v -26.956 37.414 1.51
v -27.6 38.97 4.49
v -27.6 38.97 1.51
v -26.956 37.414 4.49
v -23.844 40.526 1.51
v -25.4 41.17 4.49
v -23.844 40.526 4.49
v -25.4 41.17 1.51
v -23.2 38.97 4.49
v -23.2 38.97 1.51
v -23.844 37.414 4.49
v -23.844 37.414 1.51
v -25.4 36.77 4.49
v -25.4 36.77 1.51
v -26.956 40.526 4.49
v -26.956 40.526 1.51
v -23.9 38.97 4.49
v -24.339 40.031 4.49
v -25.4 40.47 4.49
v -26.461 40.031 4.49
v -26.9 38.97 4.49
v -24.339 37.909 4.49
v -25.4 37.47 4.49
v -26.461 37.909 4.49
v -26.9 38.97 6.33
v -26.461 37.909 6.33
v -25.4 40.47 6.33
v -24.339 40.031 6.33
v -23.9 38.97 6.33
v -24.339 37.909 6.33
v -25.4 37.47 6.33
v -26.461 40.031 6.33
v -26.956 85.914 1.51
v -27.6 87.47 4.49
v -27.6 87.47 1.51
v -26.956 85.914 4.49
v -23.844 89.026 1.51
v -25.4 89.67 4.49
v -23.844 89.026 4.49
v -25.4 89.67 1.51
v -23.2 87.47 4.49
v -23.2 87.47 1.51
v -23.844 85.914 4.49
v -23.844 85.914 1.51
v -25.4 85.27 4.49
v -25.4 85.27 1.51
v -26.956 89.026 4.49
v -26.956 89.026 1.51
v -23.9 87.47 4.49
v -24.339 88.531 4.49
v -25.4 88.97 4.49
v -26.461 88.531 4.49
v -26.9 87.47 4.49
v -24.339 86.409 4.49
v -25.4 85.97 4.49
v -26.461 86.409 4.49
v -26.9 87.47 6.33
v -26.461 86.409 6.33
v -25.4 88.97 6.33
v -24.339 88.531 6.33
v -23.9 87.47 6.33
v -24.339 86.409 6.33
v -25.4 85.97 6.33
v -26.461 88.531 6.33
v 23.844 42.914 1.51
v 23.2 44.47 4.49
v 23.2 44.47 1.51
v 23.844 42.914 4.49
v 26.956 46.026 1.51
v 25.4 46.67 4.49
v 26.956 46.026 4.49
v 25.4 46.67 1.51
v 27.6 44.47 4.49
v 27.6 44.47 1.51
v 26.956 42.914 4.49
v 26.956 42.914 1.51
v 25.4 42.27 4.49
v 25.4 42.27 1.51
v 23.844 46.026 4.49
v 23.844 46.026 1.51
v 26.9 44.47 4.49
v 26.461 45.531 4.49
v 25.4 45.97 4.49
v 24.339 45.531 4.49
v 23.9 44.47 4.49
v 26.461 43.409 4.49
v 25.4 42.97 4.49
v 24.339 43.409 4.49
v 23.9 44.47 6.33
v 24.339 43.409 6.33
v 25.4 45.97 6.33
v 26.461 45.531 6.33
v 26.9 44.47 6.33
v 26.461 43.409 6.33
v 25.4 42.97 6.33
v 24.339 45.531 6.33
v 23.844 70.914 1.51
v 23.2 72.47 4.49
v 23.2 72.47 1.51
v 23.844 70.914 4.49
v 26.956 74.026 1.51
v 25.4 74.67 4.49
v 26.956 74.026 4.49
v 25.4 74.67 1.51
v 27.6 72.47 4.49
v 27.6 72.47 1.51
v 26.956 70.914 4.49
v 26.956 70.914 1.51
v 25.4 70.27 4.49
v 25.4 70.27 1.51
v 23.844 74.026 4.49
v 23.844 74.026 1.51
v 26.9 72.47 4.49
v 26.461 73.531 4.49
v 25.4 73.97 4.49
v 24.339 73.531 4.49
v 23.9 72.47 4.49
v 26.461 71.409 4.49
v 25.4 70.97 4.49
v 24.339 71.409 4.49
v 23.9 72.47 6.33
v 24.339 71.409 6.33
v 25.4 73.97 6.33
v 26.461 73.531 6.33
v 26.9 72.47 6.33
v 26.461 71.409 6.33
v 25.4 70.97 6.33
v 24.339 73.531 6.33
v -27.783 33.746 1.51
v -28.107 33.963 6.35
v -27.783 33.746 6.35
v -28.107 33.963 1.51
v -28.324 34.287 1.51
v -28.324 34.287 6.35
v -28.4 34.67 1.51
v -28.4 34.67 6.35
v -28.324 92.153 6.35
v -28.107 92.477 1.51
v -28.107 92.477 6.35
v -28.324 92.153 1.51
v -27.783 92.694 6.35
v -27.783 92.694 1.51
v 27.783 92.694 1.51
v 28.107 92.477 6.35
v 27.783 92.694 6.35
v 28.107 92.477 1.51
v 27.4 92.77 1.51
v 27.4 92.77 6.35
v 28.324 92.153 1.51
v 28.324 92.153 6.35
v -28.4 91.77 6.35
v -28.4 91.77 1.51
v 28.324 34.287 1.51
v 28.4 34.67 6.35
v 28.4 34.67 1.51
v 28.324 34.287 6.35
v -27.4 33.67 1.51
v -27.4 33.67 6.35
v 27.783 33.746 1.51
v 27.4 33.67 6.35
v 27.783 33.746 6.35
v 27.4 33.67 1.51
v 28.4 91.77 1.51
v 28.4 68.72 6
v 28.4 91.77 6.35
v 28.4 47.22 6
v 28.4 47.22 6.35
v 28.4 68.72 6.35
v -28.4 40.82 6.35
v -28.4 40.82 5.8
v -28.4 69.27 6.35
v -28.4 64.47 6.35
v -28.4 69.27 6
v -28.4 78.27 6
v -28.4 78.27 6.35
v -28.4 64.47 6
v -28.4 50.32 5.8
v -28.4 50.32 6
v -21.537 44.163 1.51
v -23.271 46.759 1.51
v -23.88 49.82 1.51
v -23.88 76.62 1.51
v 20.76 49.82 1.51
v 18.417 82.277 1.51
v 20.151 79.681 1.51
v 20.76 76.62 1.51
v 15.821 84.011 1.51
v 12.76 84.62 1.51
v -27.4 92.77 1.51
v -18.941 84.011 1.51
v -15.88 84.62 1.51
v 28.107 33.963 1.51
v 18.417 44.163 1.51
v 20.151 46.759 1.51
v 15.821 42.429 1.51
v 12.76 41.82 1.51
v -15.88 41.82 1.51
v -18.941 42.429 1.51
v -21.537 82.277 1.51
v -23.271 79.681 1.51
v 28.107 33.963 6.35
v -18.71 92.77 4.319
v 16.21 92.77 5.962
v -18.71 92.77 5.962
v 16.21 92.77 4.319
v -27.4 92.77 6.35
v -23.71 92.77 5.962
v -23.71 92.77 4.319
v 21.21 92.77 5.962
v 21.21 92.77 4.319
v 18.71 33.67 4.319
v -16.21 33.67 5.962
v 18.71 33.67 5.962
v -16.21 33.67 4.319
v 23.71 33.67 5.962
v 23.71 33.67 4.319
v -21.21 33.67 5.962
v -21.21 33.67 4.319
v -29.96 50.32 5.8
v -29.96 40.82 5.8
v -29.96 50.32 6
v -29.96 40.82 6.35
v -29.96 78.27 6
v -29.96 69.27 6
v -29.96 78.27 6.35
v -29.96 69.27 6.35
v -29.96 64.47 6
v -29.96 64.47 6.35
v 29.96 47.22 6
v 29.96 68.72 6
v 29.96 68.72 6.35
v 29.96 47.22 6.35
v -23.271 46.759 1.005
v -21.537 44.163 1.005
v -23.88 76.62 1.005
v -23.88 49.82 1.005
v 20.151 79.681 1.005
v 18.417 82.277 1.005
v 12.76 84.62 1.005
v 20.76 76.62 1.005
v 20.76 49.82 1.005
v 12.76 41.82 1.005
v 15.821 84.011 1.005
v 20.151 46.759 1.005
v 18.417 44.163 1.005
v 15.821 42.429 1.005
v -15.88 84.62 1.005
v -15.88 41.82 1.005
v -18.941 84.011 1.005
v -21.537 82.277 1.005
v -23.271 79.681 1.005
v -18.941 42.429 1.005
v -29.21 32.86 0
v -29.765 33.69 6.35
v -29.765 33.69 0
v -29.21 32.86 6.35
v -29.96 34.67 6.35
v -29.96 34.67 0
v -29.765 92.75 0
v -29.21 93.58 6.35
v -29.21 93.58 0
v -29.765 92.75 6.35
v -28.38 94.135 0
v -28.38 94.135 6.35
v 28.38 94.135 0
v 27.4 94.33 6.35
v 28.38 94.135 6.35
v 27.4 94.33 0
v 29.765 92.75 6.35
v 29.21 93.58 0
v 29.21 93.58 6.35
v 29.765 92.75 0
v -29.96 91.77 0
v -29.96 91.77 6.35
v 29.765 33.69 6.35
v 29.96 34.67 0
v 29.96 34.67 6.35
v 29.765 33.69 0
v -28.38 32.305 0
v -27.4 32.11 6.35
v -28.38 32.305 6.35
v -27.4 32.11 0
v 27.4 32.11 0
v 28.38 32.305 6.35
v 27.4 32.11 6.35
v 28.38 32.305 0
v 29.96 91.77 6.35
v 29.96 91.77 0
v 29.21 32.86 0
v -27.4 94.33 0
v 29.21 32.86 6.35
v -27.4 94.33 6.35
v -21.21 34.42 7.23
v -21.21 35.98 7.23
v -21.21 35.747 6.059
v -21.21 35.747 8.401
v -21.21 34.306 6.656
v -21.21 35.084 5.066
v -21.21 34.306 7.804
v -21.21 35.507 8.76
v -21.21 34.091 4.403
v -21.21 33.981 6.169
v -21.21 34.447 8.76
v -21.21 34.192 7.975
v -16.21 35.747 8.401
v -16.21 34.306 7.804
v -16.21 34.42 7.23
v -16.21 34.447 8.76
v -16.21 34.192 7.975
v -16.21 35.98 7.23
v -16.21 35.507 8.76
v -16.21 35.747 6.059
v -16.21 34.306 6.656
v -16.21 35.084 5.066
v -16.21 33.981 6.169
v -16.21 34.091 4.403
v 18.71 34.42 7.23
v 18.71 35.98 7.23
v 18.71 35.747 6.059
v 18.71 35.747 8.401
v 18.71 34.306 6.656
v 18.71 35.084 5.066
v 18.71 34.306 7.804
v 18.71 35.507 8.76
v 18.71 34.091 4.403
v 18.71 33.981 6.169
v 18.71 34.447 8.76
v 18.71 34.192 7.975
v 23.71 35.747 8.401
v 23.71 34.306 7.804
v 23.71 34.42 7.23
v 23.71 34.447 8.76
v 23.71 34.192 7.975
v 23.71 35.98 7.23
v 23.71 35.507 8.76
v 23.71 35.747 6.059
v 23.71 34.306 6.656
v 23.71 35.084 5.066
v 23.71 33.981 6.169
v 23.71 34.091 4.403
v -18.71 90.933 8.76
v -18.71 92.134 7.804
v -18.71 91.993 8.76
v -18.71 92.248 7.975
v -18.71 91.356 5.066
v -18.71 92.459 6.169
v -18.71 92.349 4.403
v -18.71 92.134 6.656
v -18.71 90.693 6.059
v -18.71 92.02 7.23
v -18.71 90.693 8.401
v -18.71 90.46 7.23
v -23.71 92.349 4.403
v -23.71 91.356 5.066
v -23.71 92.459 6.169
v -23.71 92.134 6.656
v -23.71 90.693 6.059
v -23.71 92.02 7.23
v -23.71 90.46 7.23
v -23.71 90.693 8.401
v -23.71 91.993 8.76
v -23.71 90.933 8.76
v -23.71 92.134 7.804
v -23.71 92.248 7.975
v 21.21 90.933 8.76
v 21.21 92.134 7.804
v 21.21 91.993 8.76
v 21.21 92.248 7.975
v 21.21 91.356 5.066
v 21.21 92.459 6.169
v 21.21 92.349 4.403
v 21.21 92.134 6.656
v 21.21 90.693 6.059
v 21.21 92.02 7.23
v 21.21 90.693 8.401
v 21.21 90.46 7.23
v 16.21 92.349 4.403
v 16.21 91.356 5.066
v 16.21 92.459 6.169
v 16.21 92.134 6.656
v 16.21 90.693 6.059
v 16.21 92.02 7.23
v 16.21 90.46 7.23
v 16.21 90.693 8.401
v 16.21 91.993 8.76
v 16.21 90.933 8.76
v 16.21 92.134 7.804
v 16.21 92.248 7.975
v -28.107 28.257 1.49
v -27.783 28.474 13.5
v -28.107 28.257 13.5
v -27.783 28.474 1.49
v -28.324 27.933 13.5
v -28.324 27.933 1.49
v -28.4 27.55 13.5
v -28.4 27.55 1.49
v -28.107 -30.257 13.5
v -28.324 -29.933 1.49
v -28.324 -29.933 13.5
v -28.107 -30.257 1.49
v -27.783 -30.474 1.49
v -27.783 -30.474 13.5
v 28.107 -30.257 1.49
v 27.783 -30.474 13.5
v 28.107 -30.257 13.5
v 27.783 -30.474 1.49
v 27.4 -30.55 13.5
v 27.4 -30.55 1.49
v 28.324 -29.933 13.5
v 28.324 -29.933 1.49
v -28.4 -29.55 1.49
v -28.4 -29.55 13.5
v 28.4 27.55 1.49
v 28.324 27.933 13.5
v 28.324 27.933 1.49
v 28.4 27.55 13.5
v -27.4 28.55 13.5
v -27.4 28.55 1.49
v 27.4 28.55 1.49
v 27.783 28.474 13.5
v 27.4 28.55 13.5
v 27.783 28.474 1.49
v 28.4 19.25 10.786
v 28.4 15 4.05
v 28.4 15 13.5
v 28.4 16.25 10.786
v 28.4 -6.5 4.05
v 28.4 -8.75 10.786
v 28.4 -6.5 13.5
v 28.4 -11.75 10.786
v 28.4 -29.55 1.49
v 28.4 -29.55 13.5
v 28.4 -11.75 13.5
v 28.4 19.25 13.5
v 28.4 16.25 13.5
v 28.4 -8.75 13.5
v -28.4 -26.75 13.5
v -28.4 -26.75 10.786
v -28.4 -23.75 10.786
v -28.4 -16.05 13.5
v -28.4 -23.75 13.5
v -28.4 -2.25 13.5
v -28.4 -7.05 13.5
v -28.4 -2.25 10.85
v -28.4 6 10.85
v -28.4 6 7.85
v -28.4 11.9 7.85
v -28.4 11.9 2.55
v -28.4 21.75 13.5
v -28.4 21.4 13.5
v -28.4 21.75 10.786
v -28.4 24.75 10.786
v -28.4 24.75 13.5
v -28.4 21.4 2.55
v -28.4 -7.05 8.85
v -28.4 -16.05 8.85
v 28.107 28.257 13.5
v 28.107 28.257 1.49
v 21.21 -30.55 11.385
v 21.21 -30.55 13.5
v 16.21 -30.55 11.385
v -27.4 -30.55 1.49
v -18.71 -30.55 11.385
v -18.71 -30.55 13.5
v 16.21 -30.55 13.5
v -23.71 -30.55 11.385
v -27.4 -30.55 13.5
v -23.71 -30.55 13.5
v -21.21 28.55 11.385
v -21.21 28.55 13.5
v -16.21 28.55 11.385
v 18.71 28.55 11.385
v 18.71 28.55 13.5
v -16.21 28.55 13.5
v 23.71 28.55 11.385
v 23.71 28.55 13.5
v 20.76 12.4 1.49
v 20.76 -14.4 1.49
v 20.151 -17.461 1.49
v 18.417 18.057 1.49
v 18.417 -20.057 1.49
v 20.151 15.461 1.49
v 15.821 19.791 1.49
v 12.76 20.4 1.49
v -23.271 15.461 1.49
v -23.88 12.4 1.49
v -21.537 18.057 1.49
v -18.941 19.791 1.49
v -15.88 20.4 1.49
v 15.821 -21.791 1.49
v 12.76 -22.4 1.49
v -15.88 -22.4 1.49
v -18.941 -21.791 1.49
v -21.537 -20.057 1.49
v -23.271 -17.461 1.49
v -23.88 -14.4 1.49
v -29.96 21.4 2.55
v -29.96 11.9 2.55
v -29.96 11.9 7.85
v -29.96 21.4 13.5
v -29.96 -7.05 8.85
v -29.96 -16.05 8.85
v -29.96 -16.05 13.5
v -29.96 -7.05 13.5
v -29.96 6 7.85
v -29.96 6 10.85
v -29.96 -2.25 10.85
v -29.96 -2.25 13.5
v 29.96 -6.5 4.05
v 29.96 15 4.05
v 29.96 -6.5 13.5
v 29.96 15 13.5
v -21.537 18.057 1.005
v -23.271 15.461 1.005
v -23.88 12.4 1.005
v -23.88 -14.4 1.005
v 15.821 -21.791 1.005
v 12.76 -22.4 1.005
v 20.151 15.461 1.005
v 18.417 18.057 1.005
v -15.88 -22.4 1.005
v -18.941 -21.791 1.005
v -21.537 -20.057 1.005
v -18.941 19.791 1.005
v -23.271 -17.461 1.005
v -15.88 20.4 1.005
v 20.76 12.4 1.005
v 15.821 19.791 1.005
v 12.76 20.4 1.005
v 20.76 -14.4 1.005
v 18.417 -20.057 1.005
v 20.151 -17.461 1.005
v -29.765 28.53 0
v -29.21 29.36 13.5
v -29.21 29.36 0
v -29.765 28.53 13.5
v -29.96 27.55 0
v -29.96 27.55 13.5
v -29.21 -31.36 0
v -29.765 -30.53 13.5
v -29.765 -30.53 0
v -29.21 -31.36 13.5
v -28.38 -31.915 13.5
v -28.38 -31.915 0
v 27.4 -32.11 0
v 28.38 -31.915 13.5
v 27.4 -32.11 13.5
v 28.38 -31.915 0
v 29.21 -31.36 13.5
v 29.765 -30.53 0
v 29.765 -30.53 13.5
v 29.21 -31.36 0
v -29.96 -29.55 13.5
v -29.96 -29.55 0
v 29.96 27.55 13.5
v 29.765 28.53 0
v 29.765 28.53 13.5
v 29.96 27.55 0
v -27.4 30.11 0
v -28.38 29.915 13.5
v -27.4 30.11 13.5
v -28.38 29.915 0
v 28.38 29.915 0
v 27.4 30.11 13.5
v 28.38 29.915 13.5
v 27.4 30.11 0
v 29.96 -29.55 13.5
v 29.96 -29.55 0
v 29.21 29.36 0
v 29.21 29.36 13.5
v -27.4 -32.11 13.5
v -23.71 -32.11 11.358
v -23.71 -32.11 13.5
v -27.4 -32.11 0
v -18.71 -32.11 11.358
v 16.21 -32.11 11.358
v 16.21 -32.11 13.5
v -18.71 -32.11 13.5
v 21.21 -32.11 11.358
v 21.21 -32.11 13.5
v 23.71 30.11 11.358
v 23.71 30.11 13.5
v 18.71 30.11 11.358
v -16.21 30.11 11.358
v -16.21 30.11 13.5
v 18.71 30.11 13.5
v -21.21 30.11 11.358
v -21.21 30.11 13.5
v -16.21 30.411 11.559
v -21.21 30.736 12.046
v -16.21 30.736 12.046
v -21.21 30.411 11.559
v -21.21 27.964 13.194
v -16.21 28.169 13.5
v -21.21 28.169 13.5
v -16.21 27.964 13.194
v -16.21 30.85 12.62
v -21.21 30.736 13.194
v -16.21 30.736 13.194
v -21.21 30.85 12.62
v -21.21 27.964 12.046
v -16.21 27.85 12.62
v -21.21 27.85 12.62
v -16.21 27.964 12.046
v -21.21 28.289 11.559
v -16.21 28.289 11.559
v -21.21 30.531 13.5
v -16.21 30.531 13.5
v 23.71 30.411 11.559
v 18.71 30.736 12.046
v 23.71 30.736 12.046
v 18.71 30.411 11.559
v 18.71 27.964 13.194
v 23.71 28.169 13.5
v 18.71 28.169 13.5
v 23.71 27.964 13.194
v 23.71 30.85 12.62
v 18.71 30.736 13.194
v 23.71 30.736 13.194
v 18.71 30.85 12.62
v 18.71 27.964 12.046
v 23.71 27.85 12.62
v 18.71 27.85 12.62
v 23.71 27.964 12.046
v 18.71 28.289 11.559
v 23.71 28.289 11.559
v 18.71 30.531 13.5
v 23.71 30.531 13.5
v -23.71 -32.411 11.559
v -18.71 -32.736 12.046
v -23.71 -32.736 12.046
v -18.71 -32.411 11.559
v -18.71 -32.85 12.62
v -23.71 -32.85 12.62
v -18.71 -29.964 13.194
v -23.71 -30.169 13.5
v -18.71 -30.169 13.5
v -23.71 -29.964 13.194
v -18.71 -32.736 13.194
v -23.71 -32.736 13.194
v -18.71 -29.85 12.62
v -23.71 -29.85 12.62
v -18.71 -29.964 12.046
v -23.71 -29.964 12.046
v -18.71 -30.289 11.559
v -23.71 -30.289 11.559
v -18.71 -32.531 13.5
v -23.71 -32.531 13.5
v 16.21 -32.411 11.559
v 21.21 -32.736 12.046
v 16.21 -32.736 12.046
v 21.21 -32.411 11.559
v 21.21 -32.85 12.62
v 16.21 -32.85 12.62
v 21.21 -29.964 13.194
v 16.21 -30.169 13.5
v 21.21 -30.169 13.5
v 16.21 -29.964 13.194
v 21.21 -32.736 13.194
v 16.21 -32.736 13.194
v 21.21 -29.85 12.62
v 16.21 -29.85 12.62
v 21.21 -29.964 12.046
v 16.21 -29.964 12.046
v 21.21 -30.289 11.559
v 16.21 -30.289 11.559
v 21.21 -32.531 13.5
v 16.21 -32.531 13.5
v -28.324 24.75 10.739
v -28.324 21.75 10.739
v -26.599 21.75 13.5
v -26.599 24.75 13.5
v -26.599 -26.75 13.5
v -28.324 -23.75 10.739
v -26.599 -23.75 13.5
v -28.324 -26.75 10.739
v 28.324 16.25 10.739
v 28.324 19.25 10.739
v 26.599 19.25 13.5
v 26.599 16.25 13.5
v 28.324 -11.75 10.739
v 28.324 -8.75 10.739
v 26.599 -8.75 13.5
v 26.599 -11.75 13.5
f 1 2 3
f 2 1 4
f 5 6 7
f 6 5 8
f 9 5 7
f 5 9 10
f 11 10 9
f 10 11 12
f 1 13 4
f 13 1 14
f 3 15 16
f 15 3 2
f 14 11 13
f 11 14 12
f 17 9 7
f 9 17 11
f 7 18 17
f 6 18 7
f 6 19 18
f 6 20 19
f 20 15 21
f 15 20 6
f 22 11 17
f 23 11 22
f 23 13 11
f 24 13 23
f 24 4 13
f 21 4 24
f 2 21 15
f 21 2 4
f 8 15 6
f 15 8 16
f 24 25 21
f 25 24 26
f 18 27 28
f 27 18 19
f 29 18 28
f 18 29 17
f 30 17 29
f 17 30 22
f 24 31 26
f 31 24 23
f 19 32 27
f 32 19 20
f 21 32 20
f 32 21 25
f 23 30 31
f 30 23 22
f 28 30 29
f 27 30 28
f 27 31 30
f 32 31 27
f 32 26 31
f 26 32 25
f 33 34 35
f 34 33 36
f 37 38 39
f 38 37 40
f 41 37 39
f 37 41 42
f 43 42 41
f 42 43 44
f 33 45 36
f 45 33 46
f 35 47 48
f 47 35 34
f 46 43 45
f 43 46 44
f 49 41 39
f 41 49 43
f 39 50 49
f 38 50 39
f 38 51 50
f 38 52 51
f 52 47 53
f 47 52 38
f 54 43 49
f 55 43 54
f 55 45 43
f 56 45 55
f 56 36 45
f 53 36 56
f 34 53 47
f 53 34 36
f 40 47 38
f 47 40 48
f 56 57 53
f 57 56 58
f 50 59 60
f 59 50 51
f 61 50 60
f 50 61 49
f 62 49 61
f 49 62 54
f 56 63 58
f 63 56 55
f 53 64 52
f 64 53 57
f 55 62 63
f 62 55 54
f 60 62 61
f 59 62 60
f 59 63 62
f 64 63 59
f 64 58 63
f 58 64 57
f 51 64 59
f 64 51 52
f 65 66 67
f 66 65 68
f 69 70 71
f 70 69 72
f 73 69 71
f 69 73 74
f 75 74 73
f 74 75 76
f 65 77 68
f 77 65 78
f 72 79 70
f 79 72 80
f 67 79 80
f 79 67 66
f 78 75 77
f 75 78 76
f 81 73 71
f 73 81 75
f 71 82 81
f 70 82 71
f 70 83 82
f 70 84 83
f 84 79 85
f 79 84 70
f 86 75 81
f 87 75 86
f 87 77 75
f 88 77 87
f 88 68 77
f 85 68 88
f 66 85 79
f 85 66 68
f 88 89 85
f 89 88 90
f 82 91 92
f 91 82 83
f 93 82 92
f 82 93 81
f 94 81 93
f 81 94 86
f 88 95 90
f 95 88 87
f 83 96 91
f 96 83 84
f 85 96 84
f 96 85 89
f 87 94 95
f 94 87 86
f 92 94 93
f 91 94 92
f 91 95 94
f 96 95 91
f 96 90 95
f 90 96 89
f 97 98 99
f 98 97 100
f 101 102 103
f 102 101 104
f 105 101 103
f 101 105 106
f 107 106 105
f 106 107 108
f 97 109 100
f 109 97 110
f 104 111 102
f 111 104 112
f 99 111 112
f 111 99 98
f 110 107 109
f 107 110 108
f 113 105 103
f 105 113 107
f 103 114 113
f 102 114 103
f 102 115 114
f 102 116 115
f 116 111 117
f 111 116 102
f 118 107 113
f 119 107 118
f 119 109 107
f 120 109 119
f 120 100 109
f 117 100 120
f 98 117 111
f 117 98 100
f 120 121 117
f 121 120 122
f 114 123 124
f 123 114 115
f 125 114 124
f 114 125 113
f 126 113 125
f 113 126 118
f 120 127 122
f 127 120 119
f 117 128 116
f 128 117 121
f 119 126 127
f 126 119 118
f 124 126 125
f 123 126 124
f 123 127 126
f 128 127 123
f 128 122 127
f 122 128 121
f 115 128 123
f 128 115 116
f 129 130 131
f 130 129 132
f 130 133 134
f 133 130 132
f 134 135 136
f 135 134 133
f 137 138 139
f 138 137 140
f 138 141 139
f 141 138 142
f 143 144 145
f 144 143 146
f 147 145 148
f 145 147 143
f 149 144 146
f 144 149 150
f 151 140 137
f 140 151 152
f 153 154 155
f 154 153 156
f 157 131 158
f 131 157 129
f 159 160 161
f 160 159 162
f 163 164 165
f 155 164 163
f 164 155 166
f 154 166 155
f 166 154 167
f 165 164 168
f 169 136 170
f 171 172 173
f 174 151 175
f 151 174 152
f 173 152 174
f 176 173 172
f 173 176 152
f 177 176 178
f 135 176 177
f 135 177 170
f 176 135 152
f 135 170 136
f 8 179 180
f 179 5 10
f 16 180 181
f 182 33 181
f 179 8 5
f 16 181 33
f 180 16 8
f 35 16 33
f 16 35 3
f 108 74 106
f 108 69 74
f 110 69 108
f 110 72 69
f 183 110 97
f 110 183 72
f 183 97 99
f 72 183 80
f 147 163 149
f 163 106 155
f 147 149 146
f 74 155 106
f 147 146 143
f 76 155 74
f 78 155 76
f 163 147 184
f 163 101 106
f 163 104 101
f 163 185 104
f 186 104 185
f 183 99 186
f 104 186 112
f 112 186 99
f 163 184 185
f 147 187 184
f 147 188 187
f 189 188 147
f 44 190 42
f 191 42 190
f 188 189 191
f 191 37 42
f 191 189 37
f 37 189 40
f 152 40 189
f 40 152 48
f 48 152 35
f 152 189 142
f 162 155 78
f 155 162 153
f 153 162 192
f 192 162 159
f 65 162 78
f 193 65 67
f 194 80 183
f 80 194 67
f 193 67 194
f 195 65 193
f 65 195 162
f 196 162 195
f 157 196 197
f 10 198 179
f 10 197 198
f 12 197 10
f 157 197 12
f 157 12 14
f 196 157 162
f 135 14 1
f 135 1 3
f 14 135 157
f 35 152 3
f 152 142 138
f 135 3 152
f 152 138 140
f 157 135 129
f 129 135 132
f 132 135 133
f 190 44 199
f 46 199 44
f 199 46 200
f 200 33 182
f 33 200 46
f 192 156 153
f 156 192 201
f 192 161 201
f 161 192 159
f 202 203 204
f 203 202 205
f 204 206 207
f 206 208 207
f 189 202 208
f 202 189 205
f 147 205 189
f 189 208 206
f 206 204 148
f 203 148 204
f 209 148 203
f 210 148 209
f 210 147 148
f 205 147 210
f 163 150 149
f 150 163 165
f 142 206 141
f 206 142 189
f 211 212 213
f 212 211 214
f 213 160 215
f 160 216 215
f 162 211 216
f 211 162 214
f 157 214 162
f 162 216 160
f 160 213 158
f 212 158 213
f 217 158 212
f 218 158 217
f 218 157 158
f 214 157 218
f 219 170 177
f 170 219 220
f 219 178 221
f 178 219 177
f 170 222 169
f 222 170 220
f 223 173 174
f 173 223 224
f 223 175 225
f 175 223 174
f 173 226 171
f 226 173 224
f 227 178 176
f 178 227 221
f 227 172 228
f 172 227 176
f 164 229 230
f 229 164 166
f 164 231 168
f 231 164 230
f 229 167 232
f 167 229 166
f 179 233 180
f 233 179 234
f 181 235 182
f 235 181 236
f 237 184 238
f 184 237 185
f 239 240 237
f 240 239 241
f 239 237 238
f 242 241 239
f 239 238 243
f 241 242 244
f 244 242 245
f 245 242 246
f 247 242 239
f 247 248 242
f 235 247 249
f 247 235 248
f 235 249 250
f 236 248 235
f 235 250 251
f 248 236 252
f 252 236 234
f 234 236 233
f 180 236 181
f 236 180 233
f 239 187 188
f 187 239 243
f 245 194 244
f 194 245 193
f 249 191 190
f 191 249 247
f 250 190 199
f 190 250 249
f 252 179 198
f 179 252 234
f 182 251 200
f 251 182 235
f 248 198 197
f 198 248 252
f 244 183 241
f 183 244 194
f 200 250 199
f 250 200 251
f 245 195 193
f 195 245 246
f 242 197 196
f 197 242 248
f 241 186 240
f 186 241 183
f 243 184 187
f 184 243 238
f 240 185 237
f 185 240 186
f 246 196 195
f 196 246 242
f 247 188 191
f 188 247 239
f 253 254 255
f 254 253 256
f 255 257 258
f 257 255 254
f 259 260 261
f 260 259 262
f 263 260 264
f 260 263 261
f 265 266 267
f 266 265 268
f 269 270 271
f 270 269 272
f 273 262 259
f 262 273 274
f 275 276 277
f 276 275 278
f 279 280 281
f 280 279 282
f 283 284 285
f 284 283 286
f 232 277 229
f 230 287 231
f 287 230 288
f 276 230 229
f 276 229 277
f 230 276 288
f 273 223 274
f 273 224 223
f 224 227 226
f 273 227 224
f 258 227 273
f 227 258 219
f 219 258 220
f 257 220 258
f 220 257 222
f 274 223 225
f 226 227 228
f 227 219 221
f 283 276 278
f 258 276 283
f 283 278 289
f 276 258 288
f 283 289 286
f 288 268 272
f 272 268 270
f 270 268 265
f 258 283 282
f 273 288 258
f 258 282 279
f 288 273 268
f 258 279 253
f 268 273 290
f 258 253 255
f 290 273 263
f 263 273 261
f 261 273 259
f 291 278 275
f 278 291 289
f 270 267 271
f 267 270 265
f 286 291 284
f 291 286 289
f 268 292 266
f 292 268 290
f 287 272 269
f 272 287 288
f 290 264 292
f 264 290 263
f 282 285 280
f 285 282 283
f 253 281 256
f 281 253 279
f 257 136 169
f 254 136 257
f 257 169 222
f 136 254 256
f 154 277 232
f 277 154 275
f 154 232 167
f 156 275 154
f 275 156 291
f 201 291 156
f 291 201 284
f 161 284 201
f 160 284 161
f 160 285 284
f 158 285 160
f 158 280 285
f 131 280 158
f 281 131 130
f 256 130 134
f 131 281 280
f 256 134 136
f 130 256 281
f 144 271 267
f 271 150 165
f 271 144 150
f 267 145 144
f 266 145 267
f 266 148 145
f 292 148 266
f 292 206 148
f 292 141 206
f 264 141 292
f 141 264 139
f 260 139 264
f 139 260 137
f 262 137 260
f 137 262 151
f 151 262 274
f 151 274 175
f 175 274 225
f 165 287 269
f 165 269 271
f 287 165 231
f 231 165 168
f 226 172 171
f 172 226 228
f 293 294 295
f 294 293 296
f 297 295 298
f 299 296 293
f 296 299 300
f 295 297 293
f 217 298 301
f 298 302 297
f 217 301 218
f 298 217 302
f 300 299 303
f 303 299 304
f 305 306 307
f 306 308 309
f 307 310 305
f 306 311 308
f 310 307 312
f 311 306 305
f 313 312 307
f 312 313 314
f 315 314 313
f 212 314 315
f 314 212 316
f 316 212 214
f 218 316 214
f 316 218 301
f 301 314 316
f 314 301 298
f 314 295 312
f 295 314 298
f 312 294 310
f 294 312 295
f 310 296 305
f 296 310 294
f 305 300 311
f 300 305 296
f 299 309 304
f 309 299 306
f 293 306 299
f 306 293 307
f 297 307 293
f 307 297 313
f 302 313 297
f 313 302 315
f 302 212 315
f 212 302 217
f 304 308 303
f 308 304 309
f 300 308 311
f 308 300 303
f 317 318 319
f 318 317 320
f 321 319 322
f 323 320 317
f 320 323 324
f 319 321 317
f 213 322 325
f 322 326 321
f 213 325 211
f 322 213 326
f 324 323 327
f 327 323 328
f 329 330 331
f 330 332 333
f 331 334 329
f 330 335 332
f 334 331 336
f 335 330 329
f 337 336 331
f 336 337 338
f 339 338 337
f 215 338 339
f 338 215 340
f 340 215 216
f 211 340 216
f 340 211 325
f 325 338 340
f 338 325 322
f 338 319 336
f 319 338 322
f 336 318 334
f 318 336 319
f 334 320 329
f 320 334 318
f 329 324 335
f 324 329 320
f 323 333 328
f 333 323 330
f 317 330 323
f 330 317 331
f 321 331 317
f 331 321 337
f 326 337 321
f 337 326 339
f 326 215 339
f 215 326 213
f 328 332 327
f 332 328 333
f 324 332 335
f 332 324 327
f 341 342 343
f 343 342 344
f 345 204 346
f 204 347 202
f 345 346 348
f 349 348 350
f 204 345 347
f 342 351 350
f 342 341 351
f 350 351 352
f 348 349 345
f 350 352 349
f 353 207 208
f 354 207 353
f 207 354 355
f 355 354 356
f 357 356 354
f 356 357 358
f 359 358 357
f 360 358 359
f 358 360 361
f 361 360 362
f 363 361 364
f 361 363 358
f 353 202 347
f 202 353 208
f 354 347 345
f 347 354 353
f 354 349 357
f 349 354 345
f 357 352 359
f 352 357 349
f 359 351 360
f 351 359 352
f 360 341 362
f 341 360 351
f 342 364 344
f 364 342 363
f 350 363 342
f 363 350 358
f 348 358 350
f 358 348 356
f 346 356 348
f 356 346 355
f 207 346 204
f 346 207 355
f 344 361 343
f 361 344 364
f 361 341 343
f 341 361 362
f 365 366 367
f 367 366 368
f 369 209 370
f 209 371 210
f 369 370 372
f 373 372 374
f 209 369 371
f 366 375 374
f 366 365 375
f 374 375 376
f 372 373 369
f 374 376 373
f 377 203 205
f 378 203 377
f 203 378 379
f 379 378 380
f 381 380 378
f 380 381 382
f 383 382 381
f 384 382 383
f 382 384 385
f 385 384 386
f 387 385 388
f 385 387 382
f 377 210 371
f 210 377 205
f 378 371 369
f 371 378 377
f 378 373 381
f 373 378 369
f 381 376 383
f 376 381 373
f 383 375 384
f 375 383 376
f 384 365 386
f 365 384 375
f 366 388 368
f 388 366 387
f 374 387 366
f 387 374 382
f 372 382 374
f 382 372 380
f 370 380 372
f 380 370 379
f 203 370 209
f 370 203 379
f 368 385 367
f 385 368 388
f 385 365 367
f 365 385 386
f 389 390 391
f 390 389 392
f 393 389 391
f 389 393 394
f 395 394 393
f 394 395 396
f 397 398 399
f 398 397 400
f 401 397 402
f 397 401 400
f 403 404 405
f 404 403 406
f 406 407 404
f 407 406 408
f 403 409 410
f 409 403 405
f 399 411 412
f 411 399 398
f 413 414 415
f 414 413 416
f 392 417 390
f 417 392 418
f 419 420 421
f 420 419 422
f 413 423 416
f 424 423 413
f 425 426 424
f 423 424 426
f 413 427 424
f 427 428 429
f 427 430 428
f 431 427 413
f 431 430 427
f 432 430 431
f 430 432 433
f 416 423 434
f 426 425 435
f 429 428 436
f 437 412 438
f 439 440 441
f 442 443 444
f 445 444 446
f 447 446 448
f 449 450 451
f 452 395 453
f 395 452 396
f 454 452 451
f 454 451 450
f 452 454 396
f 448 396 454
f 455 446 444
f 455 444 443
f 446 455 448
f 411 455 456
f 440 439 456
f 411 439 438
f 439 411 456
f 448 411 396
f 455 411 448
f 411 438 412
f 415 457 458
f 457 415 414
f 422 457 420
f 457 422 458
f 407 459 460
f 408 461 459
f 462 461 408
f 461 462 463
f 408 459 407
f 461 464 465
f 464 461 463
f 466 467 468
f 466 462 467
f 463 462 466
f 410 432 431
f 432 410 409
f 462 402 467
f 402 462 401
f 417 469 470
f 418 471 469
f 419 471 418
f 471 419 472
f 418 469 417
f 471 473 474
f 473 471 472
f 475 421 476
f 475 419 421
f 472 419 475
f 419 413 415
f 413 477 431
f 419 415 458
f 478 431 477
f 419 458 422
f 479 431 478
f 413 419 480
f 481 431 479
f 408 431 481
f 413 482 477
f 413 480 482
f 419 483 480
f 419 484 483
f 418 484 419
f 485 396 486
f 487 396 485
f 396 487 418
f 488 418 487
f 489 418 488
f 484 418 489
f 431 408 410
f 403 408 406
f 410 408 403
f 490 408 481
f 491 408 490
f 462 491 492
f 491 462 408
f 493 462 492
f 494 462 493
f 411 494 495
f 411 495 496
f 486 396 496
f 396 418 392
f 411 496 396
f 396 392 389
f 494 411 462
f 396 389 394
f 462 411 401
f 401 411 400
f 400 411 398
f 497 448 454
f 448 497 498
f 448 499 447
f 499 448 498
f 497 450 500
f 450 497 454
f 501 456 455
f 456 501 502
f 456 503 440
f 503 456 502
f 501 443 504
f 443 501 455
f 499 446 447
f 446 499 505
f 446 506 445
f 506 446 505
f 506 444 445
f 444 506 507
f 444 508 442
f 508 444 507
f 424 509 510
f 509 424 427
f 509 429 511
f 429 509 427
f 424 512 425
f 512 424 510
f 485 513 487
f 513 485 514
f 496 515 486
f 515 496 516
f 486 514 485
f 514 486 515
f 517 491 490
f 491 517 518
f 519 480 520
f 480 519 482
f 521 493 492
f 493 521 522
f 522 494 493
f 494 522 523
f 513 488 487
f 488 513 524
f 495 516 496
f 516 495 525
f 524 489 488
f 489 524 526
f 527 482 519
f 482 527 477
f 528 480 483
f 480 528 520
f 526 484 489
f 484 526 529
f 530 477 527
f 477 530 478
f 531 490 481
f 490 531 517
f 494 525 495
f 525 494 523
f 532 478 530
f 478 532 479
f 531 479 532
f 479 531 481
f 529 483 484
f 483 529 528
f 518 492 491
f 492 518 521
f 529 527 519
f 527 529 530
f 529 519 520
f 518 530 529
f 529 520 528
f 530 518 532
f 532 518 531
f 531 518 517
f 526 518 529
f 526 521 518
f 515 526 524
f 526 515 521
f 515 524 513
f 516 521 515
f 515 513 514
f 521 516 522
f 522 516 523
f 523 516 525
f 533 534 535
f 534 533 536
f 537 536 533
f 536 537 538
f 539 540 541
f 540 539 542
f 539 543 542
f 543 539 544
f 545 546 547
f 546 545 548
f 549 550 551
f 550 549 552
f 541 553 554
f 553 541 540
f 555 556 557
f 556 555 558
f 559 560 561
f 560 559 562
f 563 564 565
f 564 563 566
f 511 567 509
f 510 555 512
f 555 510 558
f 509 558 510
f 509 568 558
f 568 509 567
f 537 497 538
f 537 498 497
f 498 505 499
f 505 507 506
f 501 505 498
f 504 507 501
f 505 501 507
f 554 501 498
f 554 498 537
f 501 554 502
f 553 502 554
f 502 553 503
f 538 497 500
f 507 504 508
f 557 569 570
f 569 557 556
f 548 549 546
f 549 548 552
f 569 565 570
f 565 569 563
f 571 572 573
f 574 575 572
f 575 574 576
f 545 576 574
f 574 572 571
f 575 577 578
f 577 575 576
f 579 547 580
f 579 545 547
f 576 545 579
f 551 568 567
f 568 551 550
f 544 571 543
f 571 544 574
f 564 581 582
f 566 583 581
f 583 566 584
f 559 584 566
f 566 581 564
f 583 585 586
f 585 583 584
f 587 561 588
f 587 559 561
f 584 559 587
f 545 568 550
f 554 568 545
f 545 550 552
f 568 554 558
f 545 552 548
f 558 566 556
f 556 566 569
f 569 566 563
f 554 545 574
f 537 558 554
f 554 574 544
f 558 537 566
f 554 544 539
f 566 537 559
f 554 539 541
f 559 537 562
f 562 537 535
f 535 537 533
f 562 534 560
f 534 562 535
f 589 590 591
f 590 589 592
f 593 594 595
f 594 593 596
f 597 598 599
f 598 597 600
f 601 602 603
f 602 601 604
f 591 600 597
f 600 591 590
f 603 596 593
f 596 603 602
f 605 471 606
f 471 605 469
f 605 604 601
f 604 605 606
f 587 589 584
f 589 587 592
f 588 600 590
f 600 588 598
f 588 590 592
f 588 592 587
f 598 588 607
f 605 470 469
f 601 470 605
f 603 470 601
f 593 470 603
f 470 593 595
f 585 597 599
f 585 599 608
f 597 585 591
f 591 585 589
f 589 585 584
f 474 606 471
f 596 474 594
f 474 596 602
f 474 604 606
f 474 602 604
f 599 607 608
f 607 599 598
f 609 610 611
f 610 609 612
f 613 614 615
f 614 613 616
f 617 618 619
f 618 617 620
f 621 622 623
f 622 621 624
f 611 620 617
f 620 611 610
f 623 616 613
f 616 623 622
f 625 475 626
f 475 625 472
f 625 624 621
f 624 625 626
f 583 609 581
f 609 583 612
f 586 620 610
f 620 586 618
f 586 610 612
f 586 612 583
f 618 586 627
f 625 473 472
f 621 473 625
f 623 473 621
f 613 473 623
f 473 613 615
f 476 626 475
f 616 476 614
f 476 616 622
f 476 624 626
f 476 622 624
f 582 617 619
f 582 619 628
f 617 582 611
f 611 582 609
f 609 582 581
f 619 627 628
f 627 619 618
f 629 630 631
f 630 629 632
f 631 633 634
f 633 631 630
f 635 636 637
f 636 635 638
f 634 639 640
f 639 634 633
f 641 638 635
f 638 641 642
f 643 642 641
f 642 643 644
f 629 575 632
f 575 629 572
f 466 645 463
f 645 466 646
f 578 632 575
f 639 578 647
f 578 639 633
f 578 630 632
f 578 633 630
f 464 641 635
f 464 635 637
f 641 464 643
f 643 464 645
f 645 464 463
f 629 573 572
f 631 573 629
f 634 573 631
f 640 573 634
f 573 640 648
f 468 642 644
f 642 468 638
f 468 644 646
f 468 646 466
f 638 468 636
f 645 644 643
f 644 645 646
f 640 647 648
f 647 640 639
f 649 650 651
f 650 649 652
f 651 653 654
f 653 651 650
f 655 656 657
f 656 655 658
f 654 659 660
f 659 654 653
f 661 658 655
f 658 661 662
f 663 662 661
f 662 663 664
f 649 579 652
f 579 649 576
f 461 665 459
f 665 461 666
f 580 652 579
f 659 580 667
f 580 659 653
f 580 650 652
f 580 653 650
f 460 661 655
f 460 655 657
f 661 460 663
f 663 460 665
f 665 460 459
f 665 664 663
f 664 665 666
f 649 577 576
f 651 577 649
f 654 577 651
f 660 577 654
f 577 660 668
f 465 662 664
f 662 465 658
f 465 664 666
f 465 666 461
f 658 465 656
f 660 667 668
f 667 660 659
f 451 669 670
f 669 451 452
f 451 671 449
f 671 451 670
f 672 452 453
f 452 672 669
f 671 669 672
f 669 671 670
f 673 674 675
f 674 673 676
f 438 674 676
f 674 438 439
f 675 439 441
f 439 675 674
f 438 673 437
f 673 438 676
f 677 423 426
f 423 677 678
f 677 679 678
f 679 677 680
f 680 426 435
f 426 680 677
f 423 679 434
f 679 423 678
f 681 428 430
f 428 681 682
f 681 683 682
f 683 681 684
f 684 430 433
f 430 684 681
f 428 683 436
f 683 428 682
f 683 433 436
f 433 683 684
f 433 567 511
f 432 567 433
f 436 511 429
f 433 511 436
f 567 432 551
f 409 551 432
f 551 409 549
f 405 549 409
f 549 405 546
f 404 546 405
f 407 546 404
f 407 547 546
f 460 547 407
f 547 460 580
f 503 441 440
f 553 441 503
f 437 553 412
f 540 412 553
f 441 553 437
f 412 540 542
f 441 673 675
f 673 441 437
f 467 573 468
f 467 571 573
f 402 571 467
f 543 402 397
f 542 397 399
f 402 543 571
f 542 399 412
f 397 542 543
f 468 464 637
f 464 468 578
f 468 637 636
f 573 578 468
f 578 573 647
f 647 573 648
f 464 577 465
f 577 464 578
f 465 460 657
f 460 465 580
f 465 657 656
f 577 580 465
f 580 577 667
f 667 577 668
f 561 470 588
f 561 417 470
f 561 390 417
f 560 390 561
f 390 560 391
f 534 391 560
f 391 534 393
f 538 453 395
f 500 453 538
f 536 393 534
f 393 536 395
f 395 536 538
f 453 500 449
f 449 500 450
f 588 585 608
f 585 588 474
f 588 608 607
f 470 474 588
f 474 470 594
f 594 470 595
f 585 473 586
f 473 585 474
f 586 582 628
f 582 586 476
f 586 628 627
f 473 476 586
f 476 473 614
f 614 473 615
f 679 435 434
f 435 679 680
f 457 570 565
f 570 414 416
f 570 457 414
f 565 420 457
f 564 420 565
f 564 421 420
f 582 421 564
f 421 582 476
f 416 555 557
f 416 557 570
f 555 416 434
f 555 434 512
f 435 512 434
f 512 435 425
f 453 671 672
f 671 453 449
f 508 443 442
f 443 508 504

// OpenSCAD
/*
 * Arduino / Olymexino tray and/or case
 *
 * (C) Michel Pollet <buserror@gmail.com>
 *
 ************************LICENSING TERMS***************************
 * This part is not for commercial distribution without a commercial 
 * license acquired from the author. Distribution on a small scale 
 * basis (< 25 units) in the Reprap spirit is free of charge on the
 * basis of mentioning the Author with the bill of material, any 
 * wider distribution requires my explicit, written permission.
 ******************************************************************
 */

OnlyTray = 0;

/*
 * IMPORTANT!!
 */
LayerHeight = 0.25;

// layer heigh 0.25mm, FilamentThickness = 0.39mm
// layer heigh 0.20mm, FilamentThickness = 0.45mm
FilamentThickness = 0.39;

E=0.01;
$fn = 16;

WallW = 4 * FilamentThickness;
PlaneThickness = (OnlyTray ? 4 : 6) * LayerHeight;
CutoutThickness = (OnlyTray ? 4.1 : 2) * LayerHeight; 

sizePCB = [ 55.8, 53.5, 1.6];

sizeExtraBottom = 3;
sizeExtraFront = 0.5;
sizeExtraBack = 0.5;
sizeExtraSide = 2.8;

sizeExtraMinimumTop = 11.5 + (3 * LayerHeight);	// power connector is highest
sizeExtraTop = sizeExtraMinimumTop;	
sizeExtraShield = 0;

sizeInside = [
	sizeExtraFront + sizePCB[0] + sizeExtraBack,
	sizeExtraSide + sizePCB[1] + sizeExtraSide,
	sizeExtraBottom + sizePCB[2] + sizeExtraTop + sizeExtraShield ];

sizeOutside = [
	sizeInside[0] + (2 * WallW),
	sizeInside[1] + (2 * WallW),
	sizeInside[2] + (2 * PlaneThickness) ];

psuSize = [ 0, 9.5, 11.5];
psuPos = [0, 9.1, (psuSize[2] / 2) - 0.2];
batSize = [0, 6.5, 6 ];
batPos = [0, psuPos[1] + 7.4, batSize[2] / 2];
vccSize = [0, 8.6, 3];
vccPos = [0, psuPos[1] + 14.6, vccSize[2] / 2];
usbSize = [ 0, 9, 5 ];
usbPos = [0, 37.3, usbSize[2] / 2];
uextSize = [0, 21.5, 9.8];
uextPos = [ 0, 7.5 + ((35.5 - 7.5) / 2), uextSize[2] / 2];

holeR = 3/2;
holeInset = 2.5;
holeExtraH = (OnlyTray == 1 ? 3 : 1) * LayerHeight;
holePos = [
	[holeInset, holeInset, -E],
	[holeInset, sizePCB[1] - holeInset, -E],
	[sizePCB[0] - holeInset, 8, -E],
	[sizePCB[0] - holeInset, 8 + 28, -E]
];

/*
 * The whole volume is split into 2 parts, top and bottom
 */
sliceHeight = PlaneThickness + sizeExtraBottom + sizePCB[2] +
	(OnlyTray ? vccSize[2] - 0.15 : holeExtraH);

clipSize = [1.5+(4*FilamentThickness), 1.5, 5];
clipBottomPos = 0.1 + sliceHeight + ((clipSize[0]-clipSize[1])/2);
clipPos = [
	[10, WallW-(clipSize[1]/2), clipBottomPos],
	[sizeOutside[0]-10, WallW-(clipSize[1]/2), clipBottomPos],
	[10, sizeOutside[1]-WallW+(clipSize[1]/2), clipBottomPos],
	[sizeOutside[0]-10, sizeOutside[1]-WallW+(clipSize[1]/2), clipBottomPos]
];
clipRot = [
	[0, 90, 0],
	[0, 90, 0],
	[0, 90, 180],
	[0, 90, 180],
];

/* "bottom" part */
translate([-sizeOutside[0]/2, (sizeOutside[1]/2) + 1, 0])
union() {
	difference() {
		dino();
		translate([-1,-1,sliceHeight])
			cube([sizeOutside[0]+2, sizeOutside[1]+2, sizeOutside[2]]);
	}
	if (OnlyTray != 1) {
		// this are the extra bumps for the clips
		for (i = [0:3])
			translate(clipPos[i]) rotate(clipRot[i])
				translate([0,0,clipSize[2]/4]) {
					difference() {
						ring(r1 = clipSize[0], r2 = clipSize[1], h = clipSize[2]);
						translate([-clipSize[0]*0.20,-clipSize[0]*0.65,-clipSize[2]/8])
							rotate([0,0,-18])
							cube([clipSize[0]*2, clipSize[0]*2, clipSize[2] + 2],center=true);
						translate([-clipSize[0]*2.5,0,-clipSize[0]])
							cube([clipSize[0]*2, clipSize[0]*2, clipSize[0]*2]);
					}
				}
	}
}

if (OnlyTray == 0) {
	/* "top" part */
	translate([(-sizeOutside[0]/2), (sizeOutside[1]/2-1), sizeOutside[2]])
	rotate([180,0,0])
	union() {
		difference() {
			union() {
				dino();
				for (i = [0:3])
					translate(clipPos[i]) rotate(clipRot[i])
						translate([0,-0.05,clipSize[2]/4]) {
							ring(r1 = clipSize[1], r2 = 0, h = clipSize[2]);
						}
						
				/*
				 * these are the pads that press on the pcb
				 */
				translate([0, WallW + sizeExtraSide, 
						sliceHeight ]) {		
					for (i = [0:1])
						translate([+1.8,holePos[i][1],0.8])
							rotate([0,-32,0])
								cube([1.8,3,3.5], center=true);

					for (i = [2:3])
						translate([sizeOutside[0]-1.8,holePos[i][1],0.8])
							rotate([0,32,0])
								cube([1.8,3,3.5], center=true);
				}
				
			}
			translate([-1,-1,-sizeOutside[2]+sliceHeight])
				cube([sizeOutside[0]+2, sizeOutside[1]+2, sizeOutside[2]]);
			
		}
	}
}

module dino() {
	difference() {
		dino_outside();
		dino_inside();
	}
}

module dino_outside() union() {
	roundrect(size=sizeOutside, r = WallW+1);
}

module dino_inside() union() {
	difference() {
		translate([WallW, WallW, PlaneThickness+E]) {
			difference() {
				roundrect(size=sizeInside, r = 1);
			
				// draw the bottom pilars, the pcb 'trap' and the
				// top pilars
				translate([sizeExtraFront, sizeExtraSide, -E]) 
				assign(fn=8, extra = 0.2) 
				for (i = [0:3]) {
					translate(holePos[i]) {
						cylinder(r = holeR+(3.5*extra), h = sizeExtraBottom, $fn = fn);
						translate([0,0,sizeExtraBottom - E]) {
							cylinder(r = holeR, h = sizePCB[2]+holeExtraH, $fn = fn);
						}
					}
				}
			}
		}
	}
	// bottom cutout
	translate([sizeExtraFront + (sizePCB[0] / 2), 
				WallW + sizeExtraSide + (sizePCB[1] / 2), 
				PlaneThickness + sizeInside[2] + ((CutoutThickness-(2*E)) / 2)])
		roundrect(size=[sizePCB[0] * 0.8, sizePCB[1] * 0.8, CutoutThickness+E], r = 8, center=1);
	// top cutout
	translate([sizeExtraFront + (sizePCB[0] / 2), 
				WallW + sizeExtraSide + (sizePCB[1] / 2), 
				PlaneThickness - ((CutoutThickness-(2*E)) / 2)])
		roundrect(size=[sizePCB[0] * 0.8, sizePCB[1] * 0.8, CutoutThickness+E], r = 8, center=1);
	
	// cut front holes
	assign(cut=WallW + 1, pcb = PlaneThickness + sizeExtraBottom + sizePCB[2]) {
		translate([WallW / 2, WallW + sizeExtraSide, pcb - 0.1]) {
			translate(psuPos)
				cube([cut, psuSize[1], psuSize[2]], center = true); 
			translate(usbPos)
				cube([cut, usbSize[1], usbSize[2]], center = true); 
			translate(batPos)
				cube([cut, batSize[1], batSize[2]], center = true); 
			translate(vccPos)
				cube([cut, vccSize[1], vccSize[2]], center = true); 
		}
		translate([sizeOutside[0] - (WallW / 2), WallW + sizeExtraSide, pcb - 0.1]) {
			translate(uextPos)
				cube([cut, uextSize[1], uextSize[2]], center = true); 
		}
	}
}

/*
 * Utilities
 */
module roundrect(size=[0,0,0], r=1, center=0, fit=1) {
	assign(sx = size[0] - (fit * (2 * r)), sy = size[1] - (fit * (2 * r)))
	translate([-center * (size[0] / 2), -center * (size[1] / 2), -center * (size[2] / 2)])
	linear_extrude(height=size[2], slices=1)
	hull() {
		translate([r,r,0])
			for (x=[0:1]) for (y=[0:1]) 
				translate([x*sx, y*sy, 0])
					circle(r=r);
	}
}
module ring(r1, r2, h = 1) {
	translate([0,0,-h/2])
		linear_extrude(height=h, slices=1)
		difference() {
			circle(r = r1);
			if (r2 < r1)
				circle(r = r2);
		}
}
